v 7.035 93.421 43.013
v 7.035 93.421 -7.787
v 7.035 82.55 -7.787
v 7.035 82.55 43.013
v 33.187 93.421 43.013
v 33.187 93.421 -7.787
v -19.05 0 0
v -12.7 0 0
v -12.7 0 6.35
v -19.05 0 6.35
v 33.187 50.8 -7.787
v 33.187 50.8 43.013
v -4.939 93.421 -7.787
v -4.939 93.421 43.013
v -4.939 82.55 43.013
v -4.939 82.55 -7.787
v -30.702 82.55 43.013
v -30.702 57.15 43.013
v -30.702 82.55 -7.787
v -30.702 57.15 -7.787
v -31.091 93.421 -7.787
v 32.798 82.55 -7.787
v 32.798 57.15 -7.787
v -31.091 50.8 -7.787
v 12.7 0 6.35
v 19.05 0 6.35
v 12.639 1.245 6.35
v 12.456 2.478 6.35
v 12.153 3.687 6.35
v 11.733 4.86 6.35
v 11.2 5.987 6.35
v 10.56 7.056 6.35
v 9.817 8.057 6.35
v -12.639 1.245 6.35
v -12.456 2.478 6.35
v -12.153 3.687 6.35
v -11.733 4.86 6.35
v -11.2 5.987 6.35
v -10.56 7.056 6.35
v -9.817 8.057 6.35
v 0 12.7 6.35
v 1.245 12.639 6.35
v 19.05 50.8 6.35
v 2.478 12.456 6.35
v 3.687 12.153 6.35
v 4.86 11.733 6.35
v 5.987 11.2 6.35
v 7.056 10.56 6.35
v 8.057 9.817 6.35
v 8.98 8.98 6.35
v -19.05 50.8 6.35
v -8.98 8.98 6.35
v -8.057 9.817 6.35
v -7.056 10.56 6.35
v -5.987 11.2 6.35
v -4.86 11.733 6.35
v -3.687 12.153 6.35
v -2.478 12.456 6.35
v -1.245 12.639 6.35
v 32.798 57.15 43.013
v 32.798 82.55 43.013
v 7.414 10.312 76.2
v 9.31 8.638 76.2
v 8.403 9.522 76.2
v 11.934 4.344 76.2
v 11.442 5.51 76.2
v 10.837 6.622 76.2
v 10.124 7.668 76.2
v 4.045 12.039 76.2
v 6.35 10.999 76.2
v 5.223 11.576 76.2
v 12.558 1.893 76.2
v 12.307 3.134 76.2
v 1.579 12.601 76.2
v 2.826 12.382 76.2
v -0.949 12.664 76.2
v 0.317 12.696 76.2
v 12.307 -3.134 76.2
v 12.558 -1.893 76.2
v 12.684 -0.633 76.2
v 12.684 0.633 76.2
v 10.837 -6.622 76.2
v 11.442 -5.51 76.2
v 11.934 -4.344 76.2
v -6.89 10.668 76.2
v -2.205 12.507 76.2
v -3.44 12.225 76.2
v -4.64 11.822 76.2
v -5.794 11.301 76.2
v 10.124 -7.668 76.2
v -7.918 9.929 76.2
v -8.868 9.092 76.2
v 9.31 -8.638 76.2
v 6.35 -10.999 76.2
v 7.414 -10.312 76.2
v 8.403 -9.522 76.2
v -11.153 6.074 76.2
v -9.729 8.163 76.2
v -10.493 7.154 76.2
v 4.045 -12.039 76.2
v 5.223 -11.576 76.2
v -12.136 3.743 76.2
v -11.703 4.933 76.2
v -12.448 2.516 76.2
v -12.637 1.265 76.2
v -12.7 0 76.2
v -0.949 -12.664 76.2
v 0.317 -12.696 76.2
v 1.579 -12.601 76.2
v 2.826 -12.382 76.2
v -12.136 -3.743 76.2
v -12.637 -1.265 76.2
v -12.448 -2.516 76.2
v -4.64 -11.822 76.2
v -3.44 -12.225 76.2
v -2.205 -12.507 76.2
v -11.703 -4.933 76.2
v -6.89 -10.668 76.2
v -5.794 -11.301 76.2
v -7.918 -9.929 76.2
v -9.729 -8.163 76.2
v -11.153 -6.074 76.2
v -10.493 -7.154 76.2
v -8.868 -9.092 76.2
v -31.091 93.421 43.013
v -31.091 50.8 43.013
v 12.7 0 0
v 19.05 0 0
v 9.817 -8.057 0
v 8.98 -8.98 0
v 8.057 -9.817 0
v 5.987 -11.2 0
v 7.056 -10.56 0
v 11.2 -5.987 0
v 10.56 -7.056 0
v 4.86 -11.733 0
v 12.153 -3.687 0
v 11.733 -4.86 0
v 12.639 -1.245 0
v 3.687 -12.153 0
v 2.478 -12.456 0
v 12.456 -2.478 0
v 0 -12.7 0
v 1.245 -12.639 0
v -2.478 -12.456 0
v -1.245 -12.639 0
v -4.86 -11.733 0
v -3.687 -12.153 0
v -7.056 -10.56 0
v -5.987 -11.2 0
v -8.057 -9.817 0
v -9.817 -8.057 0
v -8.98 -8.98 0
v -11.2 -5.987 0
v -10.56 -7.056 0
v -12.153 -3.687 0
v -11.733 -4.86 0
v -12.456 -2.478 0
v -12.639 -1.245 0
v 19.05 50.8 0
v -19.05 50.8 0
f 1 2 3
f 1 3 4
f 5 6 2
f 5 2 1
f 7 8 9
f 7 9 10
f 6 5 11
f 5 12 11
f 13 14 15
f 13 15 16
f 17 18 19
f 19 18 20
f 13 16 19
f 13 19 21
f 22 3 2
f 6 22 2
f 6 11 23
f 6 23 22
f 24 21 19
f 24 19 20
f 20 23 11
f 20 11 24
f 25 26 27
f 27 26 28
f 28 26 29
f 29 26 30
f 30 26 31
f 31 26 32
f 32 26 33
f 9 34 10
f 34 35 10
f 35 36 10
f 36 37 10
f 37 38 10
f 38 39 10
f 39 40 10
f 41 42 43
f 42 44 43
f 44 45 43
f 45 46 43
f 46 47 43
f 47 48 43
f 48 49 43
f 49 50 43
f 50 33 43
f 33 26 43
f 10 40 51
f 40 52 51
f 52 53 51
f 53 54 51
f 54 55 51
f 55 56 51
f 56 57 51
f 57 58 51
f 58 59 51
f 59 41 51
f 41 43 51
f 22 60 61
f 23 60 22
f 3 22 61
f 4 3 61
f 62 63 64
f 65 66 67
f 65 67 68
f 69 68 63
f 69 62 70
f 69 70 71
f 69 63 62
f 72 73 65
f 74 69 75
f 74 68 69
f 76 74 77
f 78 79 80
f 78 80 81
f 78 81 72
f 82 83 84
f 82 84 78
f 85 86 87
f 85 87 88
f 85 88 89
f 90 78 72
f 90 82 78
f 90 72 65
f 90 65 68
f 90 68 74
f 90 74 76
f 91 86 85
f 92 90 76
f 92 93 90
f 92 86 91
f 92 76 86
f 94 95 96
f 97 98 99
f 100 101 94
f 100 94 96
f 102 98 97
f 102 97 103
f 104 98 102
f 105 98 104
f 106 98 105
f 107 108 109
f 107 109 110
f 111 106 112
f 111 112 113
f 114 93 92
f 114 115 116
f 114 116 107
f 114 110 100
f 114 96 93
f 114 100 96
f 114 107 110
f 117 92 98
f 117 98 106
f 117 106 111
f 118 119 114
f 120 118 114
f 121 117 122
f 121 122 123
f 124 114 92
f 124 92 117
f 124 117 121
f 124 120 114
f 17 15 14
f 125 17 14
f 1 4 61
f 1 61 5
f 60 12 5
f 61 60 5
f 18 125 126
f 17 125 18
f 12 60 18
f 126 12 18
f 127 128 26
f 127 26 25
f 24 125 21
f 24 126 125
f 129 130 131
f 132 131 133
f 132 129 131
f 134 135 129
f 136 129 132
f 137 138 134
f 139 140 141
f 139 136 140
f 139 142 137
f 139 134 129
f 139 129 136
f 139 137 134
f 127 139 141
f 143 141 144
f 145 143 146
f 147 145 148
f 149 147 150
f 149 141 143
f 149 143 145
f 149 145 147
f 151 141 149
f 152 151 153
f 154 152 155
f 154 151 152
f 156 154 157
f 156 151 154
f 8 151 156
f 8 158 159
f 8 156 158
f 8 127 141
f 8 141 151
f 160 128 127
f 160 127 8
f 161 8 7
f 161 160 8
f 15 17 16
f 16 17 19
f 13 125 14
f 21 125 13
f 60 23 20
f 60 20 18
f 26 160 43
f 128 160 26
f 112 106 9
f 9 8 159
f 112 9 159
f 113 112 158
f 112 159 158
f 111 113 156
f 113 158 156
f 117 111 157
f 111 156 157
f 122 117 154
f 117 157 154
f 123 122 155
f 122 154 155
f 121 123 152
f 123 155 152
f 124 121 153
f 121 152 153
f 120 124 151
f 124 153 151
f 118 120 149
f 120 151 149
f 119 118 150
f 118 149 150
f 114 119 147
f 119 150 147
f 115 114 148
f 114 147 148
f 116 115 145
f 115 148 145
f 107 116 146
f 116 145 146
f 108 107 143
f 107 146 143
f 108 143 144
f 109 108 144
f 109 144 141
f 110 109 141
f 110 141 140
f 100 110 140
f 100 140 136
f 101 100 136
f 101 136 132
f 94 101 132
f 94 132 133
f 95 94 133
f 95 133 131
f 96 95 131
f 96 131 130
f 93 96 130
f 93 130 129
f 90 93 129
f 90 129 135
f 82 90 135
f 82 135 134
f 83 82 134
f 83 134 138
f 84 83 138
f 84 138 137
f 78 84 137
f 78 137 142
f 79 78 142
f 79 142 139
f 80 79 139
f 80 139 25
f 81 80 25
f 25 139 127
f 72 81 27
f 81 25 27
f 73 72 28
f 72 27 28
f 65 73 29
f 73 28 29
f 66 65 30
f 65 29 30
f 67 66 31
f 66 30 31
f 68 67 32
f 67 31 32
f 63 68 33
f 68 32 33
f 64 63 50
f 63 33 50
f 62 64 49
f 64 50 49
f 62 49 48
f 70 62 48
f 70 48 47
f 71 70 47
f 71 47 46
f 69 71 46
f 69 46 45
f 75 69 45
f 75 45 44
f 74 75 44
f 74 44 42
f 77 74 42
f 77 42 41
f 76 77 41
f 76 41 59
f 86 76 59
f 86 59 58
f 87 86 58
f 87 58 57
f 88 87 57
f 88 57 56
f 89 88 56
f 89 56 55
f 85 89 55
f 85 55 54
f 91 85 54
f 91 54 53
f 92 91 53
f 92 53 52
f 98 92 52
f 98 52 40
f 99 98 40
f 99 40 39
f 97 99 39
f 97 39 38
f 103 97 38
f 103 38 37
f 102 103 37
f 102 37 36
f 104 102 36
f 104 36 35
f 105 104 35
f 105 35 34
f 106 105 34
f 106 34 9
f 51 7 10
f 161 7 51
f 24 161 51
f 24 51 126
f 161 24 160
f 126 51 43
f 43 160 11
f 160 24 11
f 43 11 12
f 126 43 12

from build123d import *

# Parameters (mm, degrees)
SKETCH3_R            = 12.7
BOSS_EXTRUDE1_DEPTH  = 76.2
BOSS_EXTRUDE2_DEPTH  = 6.35
SKETCH6_W            = 63.5
SKETCH6_H            = 50.8
BOSS_EXTRUDE3_DEPTH  = 6.35
SKETCH9_W            = 50.8
SKETCH9_H            = 6.35
BOSS_EXTRUDE4_DEPTH  = 0.38862
SKETCH10_W           = 0.38862
SKETCH10_H           = 50.8
BOSS_EXTRUDE5_DEPTH  = 25.4
SKETCH11_W           = 50.8
SKETCH11_H           = 6.35
BOSS_EXTRUDE6_DEPTH  = 0.38862
SKETCH13_W           = 0.38862
SKETCH13_H           = 50.8
BOSS_EXTRUDE7_DEPTH  = 25.4
SKETCH14_W           = 0.38862
SKETCH14_H           = 50.8
BOSS_EXTRUDE8_DEPTH  = 10.8712
SKETCH15_W           = 50.8
SKETCH15_H           = 10.8712
BOSS_EXTRUDE9_DEPTH  = 25.76322
SKETCH16_W           = 0.38862
SKETCH16_H           = 50.8
BOSS_EXTRUDE10_DEPTH = 10.8712
SKETCH17_W           = 50.8
SKETCH17_H           = 10.8712
BOSS_EXTRUDE11_DEPTH = 25.76322


with BuildPart() as part:
    # Sketch3 → Boss-Extrude1 (new body)
    with BuildSketch(Plane.XY):
        with Locations(Location((0, 0, 0), (0, 0, 180))):
            Circle(SKETCH3_R)
    extrude(amount=BOSS_EXTRUDE1_DEPTH)

    # Sketch4 → Boss-Extrude2 (add)
    with BuildSketch(Plane(origin=(0, 0, 0), x_dir=(-1, 0, 0), z_dir=(0, 0, -1))):
        Polygon((0, 0), (19.05, 0), (19.05, 50.8), (-19.05, 50.8), (-19.05, 0), align=None)
    extrude(amount=-BOSS_EXTRUDE2_DEPTH)

    # Sketch6 → Boss-Extrude3 (add)
    with BuildSketch(Plane(origin=(0, 50.8, 0), x_dir=(1, 0, 0), z_dir=(0, 1, 0))):
        with Locations((1.04805825, -17.613482739)):
            Rectangle(SKETCH6_W, SKETCH6_H)
    extrude(amount=BOSS_EXTRUDE3_DEPTH)

    # Sketch9 → Boss-Extrude4 (add)
    with BuildSketch(Plane(origin=(32.79805825, 0, 0), x_dir=(0, 0, -1), z_dir=(1, 0, 0))):
        with Locations((-17.613482739, 53.975)):
            Rectangle(SKETCH9_W, SKETCH9_H)
    extrude(amount=BOSS_EXTRUDE4_DEPTH)

    # Sketch10 → Boss-Extrude5 (add)
    with BuildSketch(Plane(origin=(0, 57.15, 0), x_dir=(1, 0, 0), z_dir=(0, 1, 0))):
        with Locations((32.99236825, -17.613482739)):
            Rectangle(SKETCH10_W, SKETCH10_H)
    extrude(amount=BOSS_EXTRUDE5_DEPTH)

    # Sketch11 → Boss-Extrude6 (add)
    with BuildSketch(Plane.ZY.offset(30.70194175)):
        with Locations((17.613482739, 53.975)):
            Rectangle(SKETCH11_W, SKETCH11_H)
    extrude(amount=BOSS_EXTRUDE6_DEPTH)

    # Sketch13 → Boss-Extrude7 (add)
    with BuildSketch(Plane(origin=(0, 57.15, 0), x_dir=(1, 0, 0), z_dir=(0, 1, 0))):
        with Locations((-30.89625175, -17.613482739)):
            Rectangle(SKETCH13_W, SKETCH13_H)
    extrude(amount=BOSS_EXTRUDE7_DEPTH)

    # Sketch14 → Boss-Extrude8 (add)
    with BuildSketch(Plane(origin=(0, 82.55, 0), x_dir=(1, 0, 0), z_dir=(0, 1, 0))):
        with Locations((-30.89625175, -17.613482739)):
            Rectangle(SKETCH14_W, SKETCH14_H)
    extrude(amount=BOSS_EXTRUDE8_DEPTH)

    # Sketch15 → Boss-Extrude9 (add)
    with BuildSketch(Plane(origin=(-30.70194175, 0, 0), x_dir=(0, 0, -1), z_dir=(1, 0, 0))):
        with Locations((-17.613482739, 87.9856)):
            Rectangle(SKETCH15_W, SKETCH15_H)
    extrude(amount=BOSS_EXTRUDE9_DEPTH)

    # Sketch16 → Boss-Extrude10 (add)
    with BuildSketch(Plane(origin=(0, 82.55, 0), x_dir=(1, 0, 0), z_dir=(0, 1, 0))):
        with Locations((32.99236825, -17.613482739)):
            Rectangle(SKETCH16_W, SKETCH16_H)
    extrude(amount=BOSS_EXTRUDE10_DEPTH)

    # Sketch17 → Boss-Extrude11 (add)
    with BuildSketch(Plane.ZY.offset(-32.79805825)):
        with Locations((17.613482739, 87.9856)):
            Rectangle(SKETCH17_W, SKETCH17_H)
    extrude(amount=BOSS_EXTRUDE11_DEPTH)


solid = part.part
